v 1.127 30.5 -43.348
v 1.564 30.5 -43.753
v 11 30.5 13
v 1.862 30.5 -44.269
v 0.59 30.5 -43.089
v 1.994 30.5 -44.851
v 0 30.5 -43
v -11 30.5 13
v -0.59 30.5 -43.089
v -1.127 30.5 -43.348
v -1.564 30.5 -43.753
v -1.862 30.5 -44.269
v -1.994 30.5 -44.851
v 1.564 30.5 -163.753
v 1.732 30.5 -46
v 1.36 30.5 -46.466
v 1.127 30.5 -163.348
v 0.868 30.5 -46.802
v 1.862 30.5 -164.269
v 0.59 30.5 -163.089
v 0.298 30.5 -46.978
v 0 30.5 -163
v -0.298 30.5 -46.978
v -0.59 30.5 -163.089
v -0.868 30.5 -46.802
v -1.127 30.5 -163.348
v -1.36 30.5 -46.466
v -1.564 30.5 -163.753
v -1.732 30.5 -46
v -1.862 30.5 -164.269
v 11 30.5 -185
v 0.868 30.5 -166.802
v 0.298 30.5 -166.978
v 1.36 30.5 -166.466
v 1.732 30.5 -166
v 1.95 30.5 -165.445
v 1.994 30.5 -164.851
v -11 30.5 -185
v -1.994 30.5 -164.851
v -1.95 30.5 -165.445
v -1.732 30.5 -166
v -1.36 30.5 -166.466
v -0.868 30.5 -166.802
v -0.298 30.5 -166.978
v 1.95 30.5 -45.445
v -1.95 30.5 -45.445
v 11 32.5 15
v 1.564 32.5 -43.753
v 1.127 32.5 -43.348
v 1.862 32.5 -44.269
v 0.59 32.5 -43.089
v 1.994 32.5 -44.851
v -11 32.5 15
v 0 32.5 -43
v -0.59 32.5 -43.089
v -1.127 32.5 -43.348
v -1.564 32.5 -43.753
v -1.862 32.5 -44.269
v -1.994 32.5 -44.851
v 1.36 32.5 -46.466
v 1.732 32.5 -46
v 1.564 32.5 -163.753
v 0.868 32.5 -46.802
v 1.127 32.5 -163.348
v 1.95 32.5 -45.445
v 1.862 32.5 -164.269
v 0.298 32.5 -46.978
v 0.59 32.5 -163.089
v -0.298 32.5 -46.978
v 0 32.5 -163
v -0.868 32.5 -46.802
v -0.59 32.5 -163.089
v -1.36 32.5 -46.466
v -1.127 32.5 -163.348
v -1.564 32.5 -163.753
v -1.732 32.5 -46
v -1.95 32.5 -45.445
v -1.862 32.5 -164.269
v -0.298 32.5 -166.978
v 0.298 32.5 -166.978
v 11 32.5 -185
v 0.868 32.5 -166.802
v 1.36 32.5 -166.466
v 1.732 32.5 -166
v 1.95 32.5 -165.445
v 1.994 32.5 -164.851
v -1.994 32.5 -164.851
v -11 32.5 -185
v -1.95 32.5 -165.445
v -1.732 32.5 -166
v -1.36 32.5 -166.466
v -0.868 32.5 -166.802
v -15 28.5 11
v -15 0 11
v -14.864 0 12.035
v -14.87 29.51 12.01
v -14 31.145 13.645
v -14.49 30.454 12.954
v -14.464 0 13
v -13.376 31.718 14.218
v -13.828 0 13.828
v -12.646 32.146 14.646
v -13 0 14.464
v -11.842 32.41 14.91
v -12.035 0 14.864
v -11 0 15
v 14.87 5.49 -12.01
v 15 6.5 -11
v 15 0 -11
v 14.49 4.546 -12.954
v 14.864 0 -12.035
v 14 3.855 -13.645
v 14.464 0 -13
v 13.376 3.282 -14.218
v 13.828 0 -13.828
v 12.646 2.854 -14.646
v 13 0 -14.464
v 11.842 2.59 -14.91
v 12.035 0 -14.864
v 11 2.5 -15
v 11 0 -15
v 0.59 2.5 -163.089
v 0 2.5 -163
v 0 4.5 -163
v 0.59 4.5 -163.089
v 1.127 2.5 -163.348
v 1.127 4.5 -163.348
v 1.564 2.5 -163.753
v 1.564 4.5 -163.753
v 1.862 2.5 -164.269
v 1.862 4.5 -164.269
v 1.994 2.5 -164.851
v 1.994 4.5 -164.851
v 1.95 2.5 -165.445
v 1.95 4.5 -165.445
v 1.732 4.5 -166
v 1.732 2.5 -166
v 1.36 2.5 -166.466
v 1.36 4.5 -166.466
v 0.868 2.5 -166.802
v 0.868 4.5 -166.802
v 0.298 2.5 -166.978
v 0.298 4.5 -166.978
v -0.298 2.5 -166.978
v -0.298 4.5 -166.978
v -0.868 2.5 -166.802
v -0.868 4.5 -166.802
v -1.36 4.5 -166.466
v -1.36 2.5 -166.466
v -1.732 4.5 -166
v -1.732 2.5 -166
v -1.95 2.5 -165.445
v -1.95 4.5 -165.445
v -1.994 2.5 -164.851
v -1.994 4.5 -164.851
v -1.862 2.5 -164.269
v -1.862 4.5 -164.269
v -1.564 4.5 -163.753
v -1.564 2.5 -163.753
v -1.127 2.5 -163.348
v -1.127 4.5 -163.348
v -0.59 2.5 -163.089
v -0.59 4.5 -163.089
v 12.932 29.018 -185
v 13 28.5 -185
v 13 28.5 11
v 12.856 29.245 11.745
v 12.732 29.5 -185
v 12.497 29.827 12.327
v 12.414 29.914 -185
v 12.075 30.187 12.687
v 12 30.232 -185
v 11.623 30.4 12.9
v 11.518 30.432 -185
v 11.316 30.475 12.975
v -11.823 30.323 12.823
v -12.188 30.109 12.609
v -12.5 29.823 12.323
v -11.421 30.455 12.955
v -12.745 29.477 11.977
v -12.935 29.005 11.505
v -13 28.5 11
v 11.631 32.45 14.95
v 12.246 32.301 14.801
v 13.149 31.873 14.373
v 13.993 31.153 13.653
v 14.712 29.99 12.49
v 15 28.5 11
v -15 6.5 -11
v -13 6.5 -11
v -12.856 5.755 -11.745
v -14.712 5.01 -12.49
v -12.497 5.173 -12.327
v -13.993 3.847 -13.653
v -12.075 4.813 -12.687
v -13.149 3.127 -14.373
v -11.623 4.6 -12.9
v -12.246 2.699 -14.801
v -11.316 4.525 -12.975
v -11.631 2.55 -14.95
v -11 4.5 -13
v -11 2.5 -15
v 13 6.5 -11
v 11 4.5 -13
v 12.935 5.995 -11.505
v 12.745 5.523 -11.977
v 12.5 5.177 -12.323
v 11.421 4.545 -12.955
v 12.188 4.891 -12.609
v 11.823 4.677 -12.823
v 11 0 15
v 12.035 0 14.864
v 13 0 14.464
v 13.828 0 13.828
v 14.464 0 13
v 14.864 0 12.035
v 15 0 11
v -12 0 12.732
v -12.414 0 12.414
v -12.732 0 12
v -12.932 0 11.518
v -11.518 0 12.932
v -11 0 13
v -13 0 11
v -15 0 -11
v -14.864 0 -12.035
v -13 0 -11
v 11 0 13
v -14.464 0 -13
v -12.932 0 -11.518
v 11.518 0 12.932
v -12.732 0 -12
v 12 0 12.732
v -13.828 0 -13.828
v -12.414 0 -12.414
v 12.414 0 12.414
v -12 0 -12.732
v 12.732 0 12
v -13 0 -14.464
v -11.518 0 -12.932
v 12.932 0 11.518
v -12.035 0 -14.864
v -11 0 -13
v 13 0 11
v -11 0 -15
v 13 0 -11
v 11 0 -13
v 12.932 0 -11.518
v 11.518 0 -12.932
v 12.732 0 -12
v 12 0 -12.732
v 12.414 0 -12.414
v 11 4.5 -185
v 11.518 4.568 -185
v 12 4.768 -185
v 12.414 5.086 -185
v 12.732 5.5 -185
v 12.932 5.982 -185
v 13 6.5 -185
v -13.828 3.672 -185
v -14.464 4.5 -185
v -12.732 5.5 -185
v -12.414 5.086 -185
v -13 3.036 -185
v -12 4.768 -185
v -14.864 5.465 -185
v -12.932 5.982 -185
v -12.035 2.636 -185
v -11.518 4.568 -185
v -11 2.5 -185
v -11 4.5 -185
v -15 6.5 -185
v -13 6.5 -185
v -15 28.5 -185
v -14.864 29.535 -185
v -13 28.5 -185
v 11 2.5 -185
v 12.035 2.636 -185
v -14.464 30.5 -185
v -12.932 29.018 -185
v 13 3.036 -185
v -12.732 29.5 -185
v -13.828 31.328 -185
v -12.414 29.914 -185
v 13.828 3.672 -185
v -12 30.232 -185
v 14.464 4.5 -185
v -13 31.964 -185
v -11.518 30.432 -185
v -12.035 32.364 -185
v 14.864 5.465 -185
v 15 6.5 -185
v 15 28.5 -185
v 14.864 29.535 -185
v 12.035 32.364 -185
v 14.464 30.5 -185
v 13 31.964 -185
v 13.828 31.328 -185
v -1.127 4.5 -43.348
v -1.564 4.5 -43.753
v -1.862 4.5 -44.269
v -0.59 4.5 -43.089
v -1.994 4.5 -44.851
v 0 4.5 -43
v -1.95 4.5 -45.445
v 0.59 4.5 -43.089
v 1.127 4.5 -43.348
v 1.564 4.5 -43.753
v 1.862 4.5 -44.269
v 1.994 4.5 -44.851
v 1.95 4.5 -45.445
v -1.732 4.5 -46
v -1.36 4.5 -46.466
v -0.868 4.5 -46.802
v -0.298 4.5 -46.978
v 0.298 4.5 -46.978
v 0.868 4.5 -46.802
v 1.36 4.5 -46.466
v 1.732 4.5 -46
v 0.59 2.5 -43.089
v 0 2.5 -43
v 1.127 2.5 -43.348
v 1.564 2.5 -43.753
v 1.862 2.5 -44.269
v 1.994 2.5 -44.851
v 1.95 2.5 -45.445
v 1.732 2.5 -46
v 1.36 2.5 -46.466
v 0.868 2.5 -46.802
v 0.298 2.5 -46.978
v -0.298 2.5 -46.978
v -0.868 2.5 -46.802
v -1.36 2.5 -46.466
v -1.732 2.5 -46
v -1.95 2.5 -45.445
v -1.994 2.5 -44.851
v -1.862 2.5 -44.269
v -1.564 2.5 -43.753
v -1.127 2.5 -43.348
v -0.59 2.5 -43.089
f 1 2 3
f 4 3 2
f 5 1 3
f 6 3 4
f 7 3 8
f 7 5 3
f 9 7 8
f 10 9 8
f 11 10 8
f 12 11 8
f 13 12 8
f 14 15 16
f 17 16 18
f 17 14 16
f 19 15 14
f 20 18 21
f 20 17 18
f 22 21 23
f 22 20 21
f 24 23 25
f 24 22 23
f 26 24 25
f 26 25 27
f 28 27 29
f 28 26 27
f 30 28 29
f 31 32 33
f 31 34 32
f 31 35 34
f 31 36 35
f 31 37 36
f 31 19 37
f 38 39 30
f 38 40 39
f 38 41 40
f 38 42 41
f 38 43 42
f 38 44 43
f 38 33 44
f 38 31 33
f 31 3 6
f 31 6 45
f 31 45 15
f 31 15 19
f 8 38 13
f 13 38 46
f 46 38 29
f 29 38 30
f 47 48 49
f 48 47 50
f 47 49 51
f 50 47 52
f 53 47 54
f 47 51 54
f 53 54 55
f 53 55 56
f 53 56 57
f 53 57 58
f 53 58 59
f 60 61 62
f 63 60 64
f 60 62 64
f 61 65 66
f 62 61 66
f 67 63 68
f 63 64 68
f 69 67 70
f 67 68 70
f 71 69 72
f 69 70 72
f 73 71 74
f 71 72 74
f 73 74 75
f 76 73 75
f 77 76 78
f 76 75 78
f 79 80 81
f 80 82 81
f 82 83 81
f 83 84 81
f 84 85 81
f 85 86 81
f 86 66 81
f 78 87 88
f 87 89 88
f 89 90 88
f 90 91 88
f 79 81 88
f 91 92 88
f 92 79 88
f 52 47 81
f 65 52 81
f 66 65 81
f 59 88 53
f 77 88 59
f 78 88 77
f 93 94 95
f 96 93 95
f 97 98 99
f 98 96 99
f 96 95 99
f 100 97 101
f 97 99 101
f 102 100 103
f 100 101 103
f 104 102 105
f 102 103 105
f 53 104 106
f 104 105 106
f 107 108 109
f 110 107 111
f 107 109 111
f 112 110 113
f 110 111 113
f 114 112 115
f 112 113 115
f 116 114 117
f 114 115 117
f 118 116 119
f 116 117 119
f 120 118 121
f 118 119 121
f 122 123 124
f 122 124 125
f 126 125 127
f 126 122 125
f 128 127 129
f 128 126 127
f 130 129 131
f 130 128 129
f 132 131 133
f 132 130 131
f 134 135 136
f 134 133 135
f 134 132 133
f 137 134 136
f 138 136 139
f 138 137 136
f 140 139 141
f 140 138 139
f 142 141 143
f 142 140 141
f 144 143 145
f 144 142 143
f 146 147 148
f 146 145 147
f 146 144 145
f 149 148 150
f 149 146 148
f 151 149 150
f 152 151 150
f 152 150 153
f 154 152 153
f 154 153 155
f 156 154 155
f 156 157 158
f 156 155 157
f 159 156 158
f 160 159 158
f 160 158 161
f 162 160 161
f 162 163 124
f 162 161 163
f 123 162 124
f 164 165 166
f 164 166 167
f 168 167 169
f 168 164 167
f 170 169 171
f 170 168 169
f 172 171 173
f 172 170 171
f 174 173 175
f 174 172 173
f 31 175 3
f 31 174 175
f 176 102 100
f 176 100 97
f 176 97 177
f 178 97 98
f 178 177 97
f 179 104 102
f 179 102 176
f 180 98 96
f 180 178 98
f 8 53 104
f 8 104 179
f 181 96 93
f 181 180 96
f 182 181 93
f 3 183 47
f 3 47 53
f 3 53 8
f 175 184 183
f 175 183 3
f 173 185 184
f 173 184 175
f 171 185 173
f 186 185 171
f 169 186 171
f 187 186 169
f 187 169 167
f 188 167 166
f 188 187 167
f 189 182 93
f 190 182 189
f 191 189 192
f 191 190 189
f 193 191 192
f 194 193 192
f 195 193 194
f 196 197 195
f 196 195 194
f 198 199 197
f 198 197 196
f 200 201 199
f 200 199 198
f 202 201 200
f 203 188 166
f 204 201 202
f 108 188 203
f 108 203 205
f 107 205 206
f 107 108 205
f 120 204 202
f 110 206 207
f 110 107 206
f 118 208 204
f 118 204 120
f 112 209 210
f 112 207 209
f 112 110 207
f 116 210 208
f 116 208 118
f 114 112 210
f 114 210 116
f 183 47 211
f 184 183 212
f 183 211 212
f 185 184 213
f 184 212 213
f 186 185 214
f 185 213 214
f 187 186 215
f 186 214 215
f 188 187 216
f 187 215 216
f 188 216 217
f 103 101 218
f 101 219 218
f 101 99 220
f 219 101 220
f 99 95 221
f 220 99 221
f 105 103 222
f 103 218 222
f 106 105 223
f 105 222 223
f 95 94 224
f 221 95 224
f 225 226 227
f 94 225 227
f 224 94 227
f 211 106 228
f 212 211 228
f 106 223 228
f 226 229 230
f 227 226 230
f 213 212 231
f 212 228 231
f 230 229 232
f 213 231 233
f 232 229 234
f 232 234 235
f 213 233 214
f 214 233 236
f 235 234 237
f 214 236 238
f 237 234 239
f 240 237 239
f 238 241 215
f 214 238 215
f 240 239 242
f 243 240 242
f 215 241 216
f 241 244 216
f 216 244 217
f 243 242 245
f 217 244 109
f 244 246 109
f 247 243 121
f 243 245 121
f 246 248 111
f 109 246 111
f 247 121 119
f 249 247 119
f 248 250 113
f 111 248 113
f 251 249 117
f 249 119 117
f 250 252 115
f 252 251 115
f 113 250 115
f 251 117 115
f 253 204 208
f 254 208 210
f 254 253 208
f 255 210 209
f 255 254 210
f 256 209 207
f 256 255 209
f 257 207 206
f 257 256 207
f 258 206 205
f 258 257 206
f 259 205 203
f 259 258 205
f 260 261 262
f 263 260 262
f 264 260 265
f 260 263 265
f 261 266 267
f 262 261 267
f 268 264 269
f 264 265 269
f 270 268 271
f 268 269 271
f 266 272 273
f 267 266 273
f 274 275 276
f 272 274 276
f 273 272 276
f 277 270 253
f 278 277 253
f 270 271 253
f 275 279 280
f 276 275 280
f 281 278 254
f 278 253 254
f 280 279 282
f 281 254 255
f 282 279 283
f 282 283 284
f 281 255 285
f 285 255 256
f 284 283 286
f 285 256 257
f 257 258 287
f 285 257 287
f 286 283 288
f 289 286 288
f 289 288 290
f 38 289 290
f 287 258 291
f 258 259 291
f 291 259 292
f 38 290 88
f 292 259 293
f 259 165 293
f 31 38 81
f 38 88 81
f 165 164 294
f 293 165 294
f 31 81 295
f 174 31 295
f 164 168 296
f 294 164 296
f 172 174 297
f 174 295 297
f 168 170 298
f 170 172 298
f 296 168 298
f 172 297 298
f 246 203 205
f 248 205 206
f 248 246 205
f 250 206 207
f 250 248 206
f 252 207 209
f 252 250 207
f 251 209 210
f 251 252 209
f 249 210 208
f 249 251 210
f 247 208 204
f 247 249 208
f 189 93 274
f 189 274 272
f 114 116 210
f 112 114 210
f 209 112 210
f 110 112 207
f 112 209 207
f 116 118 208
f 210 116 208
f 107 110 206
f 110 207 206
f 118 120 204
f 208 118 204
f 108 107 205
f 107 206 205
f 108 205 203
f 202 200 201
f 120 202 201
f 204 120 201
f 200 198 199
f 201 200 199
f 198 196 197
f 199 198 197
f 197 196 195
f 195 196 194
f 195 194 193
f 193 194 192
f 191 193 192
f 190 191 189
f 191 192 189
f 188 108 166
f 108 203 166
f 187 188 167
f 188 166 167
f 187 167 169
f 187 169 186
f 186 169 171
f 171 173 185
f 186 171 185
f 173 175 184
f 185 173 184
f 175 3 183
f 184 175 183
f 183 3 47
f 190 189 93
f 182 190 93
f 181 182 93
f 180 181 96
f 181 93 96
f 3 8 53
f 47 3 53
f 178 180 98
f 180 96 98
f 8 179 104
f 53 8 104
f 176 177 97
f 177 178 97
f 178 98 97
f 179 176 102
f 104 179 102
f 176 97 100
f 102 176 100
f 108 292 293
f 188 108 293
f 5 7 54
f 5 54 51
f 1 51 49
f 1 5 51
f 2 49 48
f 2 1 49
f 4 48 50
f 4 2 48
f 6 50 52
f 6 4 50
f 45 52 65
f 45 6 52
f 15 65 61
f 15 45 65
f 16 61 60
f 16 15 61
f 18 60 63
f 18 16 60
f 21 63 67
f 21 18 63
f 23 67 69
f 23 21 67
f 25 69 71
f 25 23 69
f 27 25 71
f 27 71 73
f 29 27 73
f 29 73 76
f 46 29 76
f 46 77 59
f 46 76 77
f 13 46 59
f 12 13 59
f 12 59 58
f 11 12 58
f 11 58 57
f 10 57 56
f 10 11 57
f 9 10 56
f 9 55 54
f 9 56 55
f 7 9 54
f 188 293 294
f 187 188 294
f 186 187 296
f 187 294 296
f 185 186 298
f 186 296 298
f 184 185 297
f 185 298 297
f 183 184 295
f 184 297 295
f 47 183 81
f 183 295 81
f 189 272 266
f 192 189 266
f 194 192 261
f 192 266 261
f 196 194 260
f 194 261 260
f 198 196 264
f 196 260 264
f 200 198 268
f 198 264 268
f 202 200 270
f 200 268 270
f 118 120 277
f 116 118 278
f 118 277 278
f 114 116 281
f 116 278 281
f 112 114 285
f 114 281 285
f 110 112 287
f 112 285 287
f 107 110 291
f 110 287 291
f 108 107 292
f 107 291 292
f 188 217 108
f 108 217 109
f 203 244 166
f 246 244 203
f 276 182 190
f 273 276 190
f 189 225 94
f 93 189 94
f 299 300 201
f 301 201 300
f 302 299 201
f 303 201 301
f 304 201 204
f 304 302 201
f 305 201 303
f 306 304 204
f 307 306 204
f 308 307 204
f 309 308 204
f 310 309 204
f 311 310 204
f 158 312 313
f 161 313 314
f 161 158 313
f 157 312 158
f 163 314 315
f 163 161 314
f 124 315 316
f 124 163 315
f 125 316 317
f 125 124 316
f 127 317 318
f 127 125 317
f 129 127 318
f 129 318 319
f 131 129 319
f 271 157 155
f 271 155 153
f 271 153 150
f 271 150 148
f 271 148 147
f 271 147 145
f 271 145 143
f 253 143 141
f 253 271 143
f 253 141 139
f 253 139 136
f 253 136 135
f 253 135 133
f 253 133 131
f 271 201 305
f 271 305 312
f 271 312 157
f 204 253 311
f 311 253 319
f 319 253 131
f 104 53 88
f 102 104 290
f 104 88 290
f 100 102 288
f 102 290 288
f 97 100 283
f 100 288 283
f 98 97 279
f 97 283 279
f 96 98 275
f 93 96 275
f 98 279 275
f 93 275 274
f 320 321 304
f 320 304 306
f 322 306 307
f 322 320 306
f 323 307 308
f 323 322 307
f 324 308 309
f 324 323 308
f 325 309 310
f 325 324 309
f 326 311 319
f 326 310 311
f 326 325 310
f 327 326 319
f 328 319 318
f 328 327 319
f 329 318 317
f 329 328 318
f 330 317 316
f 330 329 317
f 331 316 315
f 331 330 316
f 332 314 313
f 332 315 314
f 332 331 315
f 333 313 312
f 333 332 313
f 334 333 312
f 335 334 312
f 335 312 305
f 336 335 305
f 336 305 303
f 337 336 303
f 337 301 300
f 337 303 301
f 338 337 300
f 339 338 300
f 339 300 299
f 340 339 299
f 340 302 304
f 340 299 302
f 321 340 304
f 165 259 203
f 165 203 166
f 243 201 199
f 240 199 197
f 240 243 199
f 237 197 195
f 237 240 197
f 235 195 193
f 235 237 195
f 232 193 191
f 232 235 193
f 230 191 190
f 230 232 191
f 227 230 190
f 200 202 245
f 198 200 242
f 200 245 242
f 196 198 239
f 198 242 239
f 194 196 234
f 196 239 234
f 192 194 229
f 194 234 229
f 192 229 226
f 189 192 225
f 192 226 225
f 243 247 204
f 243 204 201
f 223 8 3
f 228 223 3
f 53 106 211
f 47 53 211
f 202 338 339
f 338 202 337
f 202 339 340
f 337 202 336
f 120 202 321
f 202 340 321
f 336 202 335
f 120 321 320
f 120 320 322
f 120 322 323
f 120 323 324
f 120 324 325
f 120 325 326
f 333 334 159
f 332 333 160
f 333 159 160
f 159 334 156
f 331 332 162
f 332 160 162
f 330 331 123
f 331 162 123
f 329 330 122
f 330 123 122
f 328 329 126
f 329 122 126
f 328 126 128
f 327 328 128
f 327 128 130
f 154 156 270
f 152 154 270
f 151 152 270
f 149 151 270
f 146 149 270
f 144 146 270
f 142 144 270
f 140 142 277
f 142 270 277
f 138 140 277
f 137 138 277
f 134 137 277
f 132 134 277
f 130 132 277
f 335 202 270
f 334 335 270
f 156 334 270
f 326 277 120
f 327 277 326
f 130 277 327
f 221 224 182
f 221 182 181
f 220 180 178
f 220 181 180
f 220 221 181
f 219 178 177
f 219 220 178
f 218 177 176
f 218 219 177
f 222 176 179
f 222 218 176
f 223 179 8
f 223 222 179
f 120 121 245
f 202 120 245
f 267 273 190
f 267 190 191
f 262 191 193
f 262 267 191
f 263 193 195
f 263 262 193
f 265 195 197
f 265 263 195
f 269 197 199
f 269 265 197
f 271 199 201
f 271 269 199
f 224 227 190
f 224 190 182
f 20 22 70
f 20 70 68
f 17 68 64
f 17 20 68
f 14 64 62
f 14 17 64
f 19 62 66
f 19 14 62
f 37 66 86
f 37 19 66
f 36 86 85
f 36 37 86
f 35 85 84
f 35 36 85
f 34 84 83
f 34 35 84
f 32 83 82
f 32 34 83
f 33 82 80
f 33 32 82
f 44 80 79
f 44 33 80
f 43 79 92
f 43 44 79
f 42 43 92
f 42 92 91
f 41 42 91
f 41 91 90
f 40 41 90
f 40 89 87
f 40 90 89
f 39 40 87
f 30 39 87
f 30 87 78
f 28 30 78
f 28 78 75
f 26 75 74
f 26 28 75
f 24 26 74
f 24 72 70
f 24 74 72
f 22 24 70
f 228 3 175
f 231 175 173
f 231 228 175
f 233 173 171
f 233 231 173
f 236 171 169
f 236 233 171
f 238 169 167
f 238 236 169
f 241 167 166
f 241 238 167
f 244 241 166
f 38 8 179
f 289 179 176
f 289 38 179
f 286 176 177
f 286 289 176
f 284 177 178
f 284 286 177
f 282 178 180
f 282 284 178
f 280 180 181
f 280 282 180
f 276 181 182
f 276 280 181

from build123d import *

# Parameters (mm, degrees)
EXTRUDE_1_DEPTH          = 32.5
CUT_EXTRUDE_1_DEPTH      = 39.810436741
CUT_EXTRUDE_1_DEPTH_BACK = 39.810436741
EXTRUDE_2_REACH          = 205.178
SKETCH_4_R               = 2
CUT_EXTRUDE_2_DEPTH      = 189.431021862


with BuildPart() as part:
    # 草图1 → 凸台-拉伸1 (new body)
    with BuildSketch(Plane(origin=(0, 0, 0), x_dir=(1, 0, 0), z_dir=(0, 1, 0))):
        with BuildLine():
            Line((-11, -15), (11, -15))
            ThreePointArc((11, -15), (13.828427125, -13.828427125), (15, -11))
            Line((15, -11), (15, 11))
            ThreePointArc((15, 11), (13.828427125, 13.828427125), (11, 15))
            Line((11, 15), (-11, 15))
            ThreePointArc((-11, 15), (-13.828427125, 13.828427125), (-15, 11))
            Line((-15, 11), (-15, -11))
            ThreePointArc((-15, -11), (-13.828427125, -13.828427125), (-11, -15))
        make_face()
        with BuildLine():
            Line((-11, -13), (11, -13))
            ThreePointArc((11, -13), (12.414213562, -12.414213562), (13, -11))
            Line((13, -11), (13, 11))
            ThreePointArc((13, 11), (12.414213562, 12.414213562), (11, 13))
            Line((11, 13), (-11, 13))
            ThreePointArc((-11, 13), (-12.414213562, 12.414213562), (-13, 11))
            Line((-13, 11), (-13, -11))
            ThreePointArc((-13, -11), (-12.414213562, -12.414213562), (-11, -13))
        make_face(mode=Mode.SUBTRACT)
    extrude(amount=EXTRUDE_1_DEPTH)

    # 草图2 → 切除-拉伸1 (cut, two sides: drawn at the far end of the back side and taken through both)
    with BuildSketch(Plane(origin=(0, 0, 0), x_dir=(0, 0, -1), z_dir=(1, 0, 0)).offset(-CUT_EXTRUDE_1_DEPTH_BACK)):
        Polygon((-15, 32.5), (15, 32.5), (15, 2.5), align=None)
    extrude(amount=CUT_EXTRUDE_1_DEPTH + CUT_EXTRUDE_1_DEPTH_BACK, mode=Mode.SUBTRACT)


with BuildPart() as body_2:
    # 凸台-拉伸2: up to this plane
    extrude_2_end = Plane(origin=(-15, 2.5, -15), z_dir=(0, -0.7071067811865513, 0.7071067811865438))
    # 草图3 → 凸台-拉伸2 (new, up to the surface)
    with BuildSketch(Plane.XY.offset(-185), mode=Mode.PRIVATE) as extrude_2_sk1:
        with BuildLine():
            Line((-11, 2.5), (11, 2.5))
            ThreePointArc((11, 2.5), (13.828427125, 3.671572875), (15, 6.5))
            Line((15, 6.5), (15, 28.5))
            ThreePointArc((15, 28.5), (13.828427125, 31.328427125), (11, 32.5))
            Line((11, 32.5), (-11, 32.5))
            ThreePointArc((-11, 32.5), (-13.828427125, 31.328427125), (-15, 28.5))
            Line((-15, 28.5), (-15, 6.5))
            ThreePointArc((-15, 6.5), (-13.828427125, 3.671572875), (-11, 2.5))
        make_face()
        with BuildLine():
            Line((-11, 4.5), (11, 4.5))
            ThreePointArc((11, 4.5), (12.414213562, 5.085786438), (13, 6.5))
            Line((13, 6.5), (13, 28.5))
            ThreePointArc((13, 28.5), (12.414213562, 29.914213562), (11, 30.5))
            Line((11, 30.5), (-11, 30.5))
            ThreePointArc((-11, 30.5), (-12.414213562, 29.914213562), (-13, 28.5))
            Line((-13, 28.5), (-13, 6.5))
            ThreePointArc((-13, 6.5), (-12.414213562, 5.085786438), (-11, 4.5))
        make_face(mode=Mode.SUBTRACT)
    extrude_2_tool1 = split(extrude(extrude_2_sk1.sketch, amount=EXTRUDE_2_REACH, mode=Mode.PRIVATE), bisect_by=extrude_2_end, keep=Keep.BOTH, mode=Mode.PRIVATE)
    add(extrude_2_tool1.solids().sort_by_distance((0, 2.924264, -185))[0])

    # 草图4 → 切除-拉伸2 (cut, through all)
    with BuildSketch(Plane(origin=(0, 0, 0), x_dir=(1, 0, 0), z_dir=(0, 1, 0))):
        with Locations(Location((0, 165, 0), (0, 0, 270))):
            Circle(SKETCH_4_R)
        with Locations(Location((0, 45, 0), (0, 0, 270))):
            Circle(SKETCH_4_R)
    extrude(amount=CUT_EXTRUDE_2_DEPTH, mode=Mode.SUBTRACT)


solid = Compound([part.part, body_2.part])
